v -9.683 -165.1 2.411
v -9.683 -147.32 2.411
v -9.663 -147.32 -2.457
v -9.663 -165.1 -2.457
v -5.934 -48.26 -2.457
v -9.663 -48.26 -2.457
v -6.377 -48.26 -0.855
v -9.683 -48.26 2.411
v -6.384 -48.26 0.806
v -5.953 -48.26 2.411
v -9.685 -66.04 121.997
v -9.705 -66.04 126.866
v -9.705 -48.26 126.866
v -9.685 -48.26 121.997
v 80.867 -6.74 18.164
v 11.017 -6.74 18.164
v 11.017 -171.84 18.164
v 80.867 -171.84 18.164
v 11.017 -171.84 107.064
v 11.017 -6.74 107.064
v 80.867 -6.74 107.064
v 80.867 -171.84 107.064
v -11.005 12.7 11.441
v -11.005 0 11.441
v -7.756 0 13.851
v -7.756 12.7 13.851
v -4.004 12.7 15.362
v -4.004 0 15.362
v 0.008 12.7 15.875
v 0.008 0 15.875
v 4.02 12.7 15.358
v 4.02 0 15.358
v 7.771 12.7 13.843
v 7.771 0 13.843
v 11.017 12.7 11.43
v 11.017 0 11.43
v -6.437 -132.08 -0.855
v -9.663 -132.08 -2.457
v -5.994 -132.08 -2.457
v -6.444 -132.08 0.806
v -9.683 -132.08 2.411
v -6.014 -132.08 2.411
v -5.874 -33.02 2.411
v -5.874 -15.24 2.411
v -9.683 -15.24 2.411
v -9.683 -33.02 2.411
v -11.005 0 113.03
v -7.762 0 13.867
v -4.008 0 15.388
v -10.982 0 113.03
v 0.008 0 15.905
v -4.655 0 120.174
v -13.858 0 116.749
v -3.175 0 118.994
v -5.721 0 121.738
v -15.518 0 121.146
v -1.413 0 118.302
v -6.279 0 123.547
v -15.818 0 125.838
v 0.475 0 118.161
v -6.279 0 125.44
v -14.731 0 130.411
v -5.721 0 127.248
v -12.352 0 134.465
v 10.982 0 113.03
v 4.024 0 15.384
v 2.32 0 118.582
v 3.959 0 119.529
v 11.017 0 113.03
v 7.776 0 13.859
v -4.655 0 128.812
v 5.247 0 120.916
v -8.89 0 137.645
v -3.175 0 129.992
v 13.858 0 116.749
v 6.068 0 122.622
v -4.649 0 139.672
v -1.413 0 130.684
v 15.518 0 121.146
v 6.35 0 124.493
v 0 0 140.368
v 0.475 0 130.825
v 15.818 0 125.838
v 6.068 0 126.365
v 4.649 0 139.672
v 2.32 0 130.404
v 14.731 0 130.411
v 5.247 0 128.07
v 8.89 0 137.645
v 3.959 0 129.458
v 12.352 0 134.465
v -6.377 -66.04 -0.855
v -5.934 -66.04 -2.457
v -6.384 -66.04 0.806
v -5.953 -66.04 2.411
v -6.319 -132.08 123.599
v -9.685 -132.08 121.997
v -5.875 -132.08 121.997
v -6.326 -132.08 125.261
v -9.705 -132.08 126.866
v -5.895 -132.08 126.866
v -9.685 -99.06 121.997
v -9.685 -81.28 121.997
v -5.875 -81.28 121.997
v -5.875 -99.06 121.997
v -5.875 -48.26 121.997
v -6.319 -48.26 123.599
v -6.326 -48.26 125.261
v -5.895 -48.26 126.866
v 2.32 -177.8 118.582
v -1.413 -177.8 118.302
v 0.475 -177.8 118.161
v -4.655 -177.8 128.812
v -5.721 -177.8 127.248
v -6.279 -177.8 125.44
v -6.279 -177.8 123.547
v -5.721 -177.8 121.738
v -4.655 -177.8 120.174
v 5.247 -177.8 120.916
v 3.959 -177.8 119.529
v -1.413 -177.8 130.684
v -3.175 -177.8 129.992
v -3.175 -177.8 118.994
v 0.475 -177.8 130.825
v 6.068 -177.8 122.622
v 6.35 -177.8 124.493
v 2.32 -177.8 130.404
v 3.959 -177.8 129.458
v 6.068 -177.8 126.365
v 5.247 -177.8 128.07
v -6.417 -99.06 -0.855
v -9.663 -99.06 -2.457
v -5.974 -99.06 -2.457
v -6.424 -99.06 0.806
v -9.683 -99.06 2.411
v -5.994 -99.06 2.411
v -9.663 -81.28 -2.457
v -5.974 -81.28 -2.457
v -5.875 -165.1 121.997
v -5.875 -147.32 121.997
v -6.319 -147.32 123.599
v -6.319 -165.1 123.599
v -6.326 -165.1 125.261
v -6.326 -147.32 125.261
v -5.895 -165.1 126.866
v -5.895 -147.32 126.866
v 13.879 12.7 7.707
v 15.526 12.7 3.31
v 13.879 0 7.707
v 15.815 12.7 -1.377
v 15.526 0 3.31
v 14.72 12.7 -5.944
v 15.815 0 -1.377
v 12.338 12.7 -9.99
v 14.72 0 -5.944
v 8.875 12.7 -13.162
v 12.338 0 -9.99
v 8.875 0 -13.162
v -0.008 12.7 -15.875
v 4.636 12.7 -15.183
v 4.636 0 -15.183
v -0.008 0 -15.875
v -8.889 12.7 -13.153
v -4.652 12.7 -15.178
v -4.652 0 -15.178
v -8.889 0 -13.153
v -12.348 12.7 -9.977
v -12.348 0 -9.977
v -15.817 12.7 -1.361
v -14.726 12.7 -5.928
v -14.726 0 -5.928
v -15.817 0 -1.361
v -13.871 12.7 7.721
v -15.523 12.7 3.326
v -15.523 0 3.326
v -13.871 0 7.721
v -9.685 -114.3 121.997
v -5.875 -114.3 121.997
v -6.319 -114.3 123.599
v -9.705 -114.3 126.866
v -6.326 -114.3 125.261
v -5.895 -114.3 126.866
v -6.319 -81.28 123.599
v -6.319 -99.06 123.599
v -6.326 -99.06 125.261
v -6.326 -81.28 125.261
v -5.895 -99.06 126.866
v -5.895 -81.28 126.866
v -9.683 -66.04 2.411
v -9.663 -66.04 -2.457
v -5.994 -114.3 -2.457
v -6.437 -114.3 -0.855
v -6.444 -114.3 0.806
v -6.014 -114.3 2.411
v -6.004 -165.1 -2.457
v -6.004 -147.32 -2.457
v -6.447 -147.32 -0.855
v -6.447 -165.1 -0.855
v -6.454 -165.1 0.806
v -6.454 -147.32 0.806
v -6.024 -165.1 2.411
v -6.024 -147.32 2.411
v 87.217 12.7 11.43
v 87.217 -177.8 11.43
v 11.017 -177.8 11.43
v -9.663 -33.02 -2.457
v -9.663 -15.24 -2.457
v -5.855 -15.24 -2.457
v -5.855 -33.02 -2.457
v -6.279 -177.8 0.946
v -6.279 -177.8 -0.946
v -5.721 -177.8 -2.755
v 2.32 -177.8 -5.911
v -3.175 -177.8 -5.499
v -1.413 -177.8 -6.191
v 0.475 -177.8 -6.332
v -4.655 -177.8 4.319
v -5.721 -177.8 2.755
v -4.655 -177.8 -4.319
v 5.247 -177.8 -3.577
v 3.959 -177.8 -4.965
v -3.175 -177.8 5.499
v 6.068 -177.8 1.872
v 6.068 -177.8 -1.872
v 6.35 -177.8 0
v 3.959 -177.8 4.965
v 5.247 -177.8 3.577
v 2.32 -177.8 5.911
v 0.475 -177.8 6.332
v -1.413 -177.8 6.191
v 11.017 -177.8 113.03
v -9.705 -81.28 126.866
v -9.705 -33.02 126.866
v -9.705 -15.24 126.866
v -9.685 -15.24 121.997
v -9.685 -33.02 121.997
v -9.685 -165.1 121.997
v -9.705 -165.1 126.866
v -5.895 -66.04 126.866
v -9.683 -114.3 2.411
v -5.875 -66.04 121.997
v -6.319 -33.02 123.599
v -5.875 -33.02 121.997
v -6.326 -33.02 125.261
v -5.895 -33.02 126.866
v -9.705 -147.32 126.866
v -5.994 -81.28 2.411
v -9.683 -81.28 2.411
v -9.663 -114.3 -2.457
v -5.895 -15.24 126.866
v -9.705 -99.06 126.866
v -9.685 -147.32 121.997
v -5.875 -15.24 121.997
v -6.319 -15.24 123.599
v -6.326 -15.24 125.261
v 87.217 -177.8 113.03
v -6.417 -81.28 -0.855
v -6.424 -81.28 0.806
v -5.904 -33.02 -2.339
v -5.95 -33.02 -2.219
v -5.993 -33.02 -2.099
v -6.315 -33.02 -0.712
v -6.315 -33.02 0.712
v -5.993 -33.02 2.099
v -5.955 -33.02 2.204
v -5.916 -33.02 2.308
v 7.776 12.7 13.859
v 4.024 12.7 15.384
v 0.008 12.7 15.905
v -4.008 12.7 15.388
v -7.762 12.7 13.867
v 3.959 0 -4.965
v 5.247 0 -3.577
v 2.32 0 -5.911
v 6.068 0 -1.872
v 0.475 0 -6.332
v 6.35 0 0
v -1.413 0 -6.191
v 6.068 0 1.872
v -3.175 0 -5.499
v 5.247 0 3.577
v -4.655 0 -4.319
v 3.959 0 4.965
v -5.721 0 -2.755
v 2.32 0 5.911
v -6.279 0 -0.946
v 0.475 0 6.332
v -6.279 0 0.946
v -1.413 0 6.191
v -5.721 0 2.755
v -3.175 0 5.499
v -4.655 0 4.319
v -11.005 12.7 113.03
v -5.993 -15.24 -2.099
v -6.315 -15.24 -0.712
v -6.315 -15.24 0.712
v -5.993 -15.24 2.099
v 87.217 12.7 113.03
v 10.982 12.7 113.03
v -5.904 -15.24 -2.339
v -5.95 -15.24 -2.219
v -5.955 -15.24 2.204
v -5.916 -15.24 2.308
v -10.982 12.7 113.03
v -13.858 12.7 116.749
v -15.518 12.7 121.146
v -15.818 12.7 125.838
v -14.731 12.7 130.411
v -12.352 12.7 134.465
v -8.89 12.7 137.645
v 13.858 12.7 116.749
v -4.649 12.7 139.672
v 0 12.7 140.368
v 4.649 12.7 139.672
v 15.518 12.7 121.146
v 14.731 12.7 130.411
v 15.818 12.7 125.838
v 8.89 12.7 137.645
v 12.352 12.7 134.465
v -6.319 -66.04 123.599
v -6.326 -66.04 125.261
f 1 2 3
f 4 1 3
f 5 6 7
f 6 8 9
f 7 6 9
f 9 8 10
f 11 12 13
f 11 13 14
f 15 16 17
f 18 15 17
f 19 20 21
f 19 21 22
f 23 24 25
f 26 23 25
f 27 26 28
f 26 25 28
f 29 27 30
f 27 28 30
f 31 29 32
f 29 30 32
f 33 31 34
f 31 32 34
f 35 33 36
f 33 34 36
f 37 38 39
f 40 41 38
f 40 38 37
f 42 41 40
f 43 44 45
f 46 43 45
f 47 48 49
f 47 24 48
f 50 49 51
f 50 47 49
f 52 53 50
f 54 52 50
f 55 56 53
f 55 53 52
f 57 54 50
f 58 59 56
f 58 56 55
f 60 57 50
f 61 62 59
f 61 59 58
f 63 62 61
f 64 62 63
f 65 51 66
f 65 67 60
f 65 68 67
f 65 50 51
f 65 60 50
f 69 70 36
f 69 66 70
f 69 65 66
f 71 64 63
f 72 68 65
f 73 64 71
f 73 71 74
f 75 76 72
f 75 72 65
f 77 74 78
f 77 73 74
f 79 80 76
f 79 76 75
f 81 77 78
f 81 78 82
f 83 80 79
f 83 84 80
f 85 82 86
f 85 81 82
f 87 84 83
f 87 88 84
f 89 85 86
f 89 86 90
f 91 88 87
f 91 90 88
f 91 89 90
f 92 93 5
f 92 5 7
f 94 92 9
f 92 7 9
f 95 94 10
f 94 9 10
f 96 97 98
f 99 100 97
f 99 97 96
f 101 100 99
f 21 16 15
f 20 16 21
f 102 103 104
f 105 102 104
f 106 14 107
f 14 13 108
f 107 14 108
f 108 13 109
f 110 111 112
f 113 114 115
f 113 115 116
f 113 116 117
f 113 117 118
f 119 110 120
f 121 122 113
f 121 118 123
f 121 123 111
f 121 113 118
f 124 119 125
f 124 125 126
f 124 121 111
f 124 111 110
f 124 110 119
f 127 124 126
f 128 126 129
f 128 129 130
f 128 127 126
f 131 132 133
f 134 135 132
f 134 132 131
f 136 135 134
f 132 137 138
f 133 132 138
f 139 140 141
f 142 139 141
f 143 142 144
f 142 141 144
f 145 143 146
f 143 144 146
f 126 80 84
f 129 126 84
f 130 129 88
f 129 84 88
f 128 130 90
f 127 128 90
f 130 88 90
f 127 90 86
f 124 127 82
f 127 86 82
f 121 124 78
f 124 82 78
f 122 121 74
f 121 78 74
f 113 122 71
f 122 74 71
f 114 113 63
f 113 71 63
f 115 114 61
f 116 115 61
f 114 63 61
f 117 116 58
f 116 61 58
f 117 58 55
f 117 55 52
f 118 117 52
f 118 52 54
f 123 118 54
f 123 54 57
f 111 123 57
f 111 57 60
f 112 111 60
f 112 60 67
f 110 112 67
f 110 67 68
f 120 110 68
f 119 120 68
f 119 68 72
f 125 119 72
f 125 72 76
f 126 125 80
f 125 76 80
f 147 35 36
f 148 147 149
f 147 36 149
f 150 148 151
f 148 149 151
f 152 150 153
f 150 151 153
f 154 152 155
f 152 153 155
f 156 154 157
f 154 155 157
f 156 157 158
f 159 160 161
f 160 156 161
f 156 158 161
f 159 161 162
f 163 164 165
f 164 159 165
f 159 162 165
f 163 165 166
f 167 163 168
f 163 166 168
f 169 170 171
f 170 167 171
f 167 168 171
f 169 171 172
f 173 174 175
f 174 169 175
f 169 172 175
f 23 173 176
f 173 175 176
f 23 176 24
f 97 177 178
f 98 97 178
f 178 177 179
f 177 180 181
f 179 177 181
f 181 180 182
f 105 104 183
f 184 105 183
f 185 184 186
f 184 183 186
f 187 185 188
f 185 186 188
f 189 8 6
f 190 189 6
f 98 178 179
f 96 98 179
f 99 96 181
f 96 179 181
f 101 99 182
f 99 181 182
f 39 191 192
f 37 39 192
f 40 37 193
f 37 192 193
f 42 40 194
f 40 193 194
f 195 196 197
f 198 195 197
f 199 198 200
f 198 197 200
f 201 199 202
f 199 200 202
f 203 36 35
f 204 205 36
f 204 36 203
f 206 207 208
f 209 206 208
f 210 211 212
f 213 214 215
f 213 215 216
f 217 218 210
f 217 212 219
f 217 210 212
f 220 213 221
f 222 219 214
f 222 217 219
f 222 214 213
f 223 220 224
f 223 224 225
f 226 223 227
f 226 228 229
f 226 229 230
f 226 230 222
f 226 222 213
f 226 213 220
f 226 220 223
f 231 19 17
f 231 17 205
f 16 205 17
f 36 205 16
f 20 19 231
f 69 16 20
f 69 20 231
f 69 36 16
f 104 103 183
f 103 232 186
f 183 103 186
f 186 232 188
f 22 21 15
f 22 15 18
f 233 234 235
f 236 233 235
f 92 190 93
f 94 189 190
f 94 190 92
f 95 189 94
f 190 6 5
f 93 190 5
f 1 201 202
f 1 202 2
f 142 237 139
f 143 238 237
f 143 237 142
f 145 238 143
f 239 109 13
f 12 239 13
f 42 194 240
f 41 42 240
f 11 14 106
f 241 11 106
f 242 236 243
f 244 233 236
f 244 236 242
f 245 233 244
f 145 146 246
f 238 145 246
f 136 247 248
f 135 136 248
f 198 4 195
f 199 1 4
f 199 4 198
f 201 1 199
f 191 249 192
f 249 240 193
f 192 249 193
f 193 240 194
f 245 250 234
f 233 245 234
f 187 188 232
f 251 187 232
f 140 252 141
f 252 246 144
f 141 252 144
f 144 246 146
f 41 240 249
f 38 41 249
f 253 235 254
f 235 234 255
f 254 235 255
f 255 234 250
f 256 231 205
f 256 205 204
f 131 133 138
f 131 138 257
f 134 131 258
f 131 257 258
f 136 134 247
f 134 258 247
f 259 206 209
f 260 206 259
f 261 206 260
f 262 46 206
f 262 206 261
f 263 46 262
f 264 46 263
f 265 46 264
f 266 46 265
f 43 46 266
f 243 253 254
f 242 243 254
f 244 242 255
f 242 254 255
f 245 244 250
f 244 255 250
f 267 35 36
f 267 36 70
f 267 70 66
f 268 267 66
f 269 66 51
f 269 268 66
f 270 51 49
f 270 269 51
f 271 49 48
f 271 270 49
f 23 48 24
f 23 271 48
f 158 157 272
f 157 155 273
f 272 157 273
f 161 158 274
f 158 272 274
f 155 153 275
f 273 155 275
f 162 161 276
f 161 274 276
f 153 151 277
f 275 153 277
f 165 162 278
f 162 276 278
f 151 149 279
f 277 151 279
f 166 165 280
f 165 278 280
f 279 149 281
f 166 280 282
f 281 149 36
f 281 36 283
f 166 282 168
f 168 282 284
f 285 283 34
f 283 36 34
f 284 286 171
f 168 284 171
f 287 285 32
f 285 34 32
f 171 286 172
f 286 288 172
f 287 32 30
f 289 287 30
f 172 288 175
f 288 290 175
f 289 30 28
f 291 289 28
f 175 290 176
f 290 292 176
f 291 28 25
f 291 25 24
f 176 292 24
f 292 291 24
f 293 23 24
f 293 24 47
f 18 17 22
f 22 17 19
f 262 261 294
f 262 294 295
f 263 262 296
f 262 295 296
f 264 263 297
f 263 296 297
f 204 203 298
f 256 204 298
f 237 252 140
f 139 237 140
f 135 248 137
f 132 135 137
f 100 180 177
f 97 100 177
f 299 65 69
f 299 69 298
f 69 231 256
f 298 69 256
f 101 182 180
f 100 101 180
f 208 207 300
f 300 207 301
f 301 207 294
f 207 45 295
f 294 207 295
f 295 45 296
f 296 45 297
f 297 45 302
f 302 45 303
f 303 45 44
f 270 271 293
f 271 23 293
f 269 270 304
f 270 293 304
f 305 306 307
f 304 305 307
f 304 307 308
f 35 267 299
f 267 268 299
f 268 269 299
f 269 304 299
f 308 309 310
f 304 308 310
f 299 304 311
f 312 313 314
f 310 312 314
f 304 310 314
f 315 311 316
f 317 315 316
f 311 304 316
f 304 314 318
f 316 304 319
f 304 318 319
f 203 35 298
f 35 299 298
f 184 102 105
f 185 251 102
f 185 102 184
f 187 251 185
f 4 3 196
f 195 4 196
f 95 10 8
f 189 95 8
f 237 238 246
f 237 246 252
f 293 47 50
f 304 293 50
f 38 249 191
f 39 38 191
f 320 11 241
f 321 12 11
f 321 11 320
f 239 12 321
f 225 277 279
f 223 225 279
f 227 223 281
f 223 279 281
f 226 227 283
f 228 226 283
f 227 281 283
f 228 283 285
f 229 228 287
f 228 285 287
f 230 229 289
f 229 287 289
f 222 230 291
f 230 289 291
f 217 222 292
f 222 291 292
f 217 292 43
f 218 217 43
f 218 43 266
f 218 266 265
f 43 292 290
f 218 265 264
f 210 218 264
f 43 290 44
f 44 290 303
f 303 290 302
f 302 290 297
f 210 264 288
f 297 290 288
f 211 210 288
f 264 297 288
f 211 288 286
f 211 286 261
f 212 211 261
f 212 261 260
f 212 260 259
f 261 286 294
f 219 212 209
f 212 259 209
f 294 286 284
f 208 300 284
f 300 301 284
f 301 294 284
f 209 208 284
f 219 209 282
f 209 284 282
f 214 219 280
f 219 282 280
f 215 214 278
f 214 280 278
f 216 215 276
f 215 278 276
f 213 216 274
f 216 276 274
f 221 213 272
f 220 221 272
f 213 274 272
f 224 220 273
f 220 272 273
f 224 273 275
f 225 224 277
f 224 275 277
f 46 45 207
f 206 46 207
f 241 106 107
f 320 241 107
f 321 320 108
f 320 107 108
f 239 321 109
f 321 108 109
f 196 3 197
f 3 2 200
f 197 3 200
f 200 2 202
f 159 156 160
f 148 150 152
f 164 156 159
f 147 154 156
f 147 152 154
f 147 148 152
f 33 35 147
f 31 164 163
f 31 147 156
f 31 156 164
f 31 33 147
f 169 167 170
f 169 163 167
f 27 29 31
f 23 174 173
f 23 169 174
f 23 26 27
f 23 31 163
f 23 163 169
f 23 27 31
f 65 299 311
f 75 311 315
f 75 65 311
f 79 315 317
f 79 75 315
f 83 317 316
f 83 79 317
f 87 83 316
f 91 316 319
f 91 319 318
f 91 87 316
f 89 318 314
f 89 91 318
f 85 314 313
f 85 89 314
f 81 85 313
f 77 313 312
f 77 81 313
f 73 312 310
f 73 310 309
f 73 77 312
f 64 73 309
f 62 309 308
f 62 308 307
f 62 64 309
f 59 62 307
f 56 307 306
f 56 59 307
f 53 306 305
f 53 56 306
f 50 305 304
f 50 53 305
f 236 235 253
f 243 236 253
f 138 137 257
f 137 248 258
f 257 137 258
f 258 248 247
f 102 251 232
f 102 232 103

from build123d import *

# Parameters (mm, degrees)
F0_R           = 6.35
F1_DEPTH       = 177.8
F2_R           = 15.875
F2_R_2         = 6.35
F3_DEPTH       = 12.7
F6_DEPTH       = 12.7
F5_R           = 15.875
F7_DEPTH       = 12.7
F8_R           = 6.35
F9_DEPTH       = 177.8
F10_W          = 76.2
F10_H          = 101.6
F11_DEPTH      = 177.8
F11_DEPTH_BACK = 12.7
F12_W          = 165.1
F12_H          = 88.9
F13_DEPTH      = 69.85
F15_START      = 15.24
F15_DEPTH      = 17.78
F17_START      = 15.24
F17_DEPTH      = 17.78
F19_START      = 15.24
F19_DEPTH      = 17.78
F21_START      = 15.24
F21_DEPTH      = 17.78
F23_START      = 15.24
F23_DEPTH      = 17.78
F25_START      = 15.24
F25_DEPTH      = 17.78
F26_START      = 15.24
F26_DEPTH      = 17.78
F27_START      = 15.24
F27_DEPTH      = 17.78
F28_START      = 15.24
F28_DEPTH      = 17.78
F29_START      = 15.24
F29_DEPTH      = 17.78


# Not quite as in the source:
# - ends of sketch curves that miss each other by under 0.0002 mm in the source are joined


with BuildPart() as f1:
    # F0 (on Front) → F1 (new body)
    with BuildSketch(Plane.XZ):
        Circle(F0_R)
    extrude(amount=F1_DEPTH)

    # F2 (on face) → F3 (join)
    with BuildSketch(Plane(origin=(0, 0, 0), x_dir=(-1, 0, 0), z_dir=(0, 1, 0))):
        Circle(F2_R)
        Circle(F2_R_2, mode=Mode.SUBTRACT)
        Circle(F2_R_2)
    extrude(amount=F3_DEPTH)



with BuildPart() as f6:
    # F4 (on face) → F6 (new body)
    with BuildSketch(Plane(origin=(0, 12.7, 0), x_dir=(-1, 0, 0), z_dir=(0, 1, 0))):
        with BuildLine():
            ThreePointArc((-11.0168382488, 11.43), (-0.0082589267, 15.9048158213), (11.0049617512, 11.4414353057))
            Line((11.0049617512, 11.4414353057), (11.0049617512, 113.03))
            Line((11.0049617512, 113.03), (-11.0168382488, 113.03))
            Line((-11.0168382488, 113.03), (-11.0168382488, 11.43))
        make_face()
    extrude(amount=-F6_DEPTH)

    # F5 (on Front) → F7 (join)
    with BuildSketch(Plane.XZ):
        with Locations((0, 124.4932145201)):
            Circle(F5_R)
    extrude(amount=-F7_DEPTH)

    # F8 (on face) → F9 (join)
    with BuildSketch(Plane.XZ):
        with Locations((0, 124.4932145201)):
            Circle(F8_R)
    extrude(amount=F9_DEPTH)


with BuildPart() as f1_1:
    add(f1.part)

    add(f6.part)  # F11 merges F6
    # F10 (on face) → F11 (join, two sides)
    with BuildSketch(Plane.XZ) as f11_sk:
        with Locations((49.1168382488, 62.23)):
            Rectangle(F10_W, F10_H)
    extrude(amount=F11_DEPTH)
    extrude(f11_sk.sketch, amount=-F11_DEPTH_BACK)

    # F12 (on face) → F13 (cut)
    with BuildSketch(Plane(origin=(11.0168382488, 0, 0), x_dir=(0, -1, 0), z_dir=(-1, 0, 0))):
        with Locations((89.290167737, 62.6140534163)):
            Rectangle(F12_W, F12_H)
    extrude(amount=-F13_DEPTH, mode=Mode.SUBTRACT)

    # F14 (on face) → F15 (join)
    with BuildSketch(Plane.XZ.offset(F15_START)):
        with BuildLine():
            ThreePointArc((-5.9930673501, -2.0989625382), (-6.3552943125, 0), (-5.9930673501, 2.0989625382))
            ThreePointArc((-5.9930673501, 2.0989625382), (-5.9358254943, 2.2557649925), (-5.8744818664, 2.4110086688))
            Line((-5.8744818664, 2.4110086688), (-9.6825771242, 2.4110086688))
            Line((-9.6825771242, 2.4110086688), (-9.6630874508, -2.4572083608))
            Line((-9.6630874508, -2.4572083608), (-5.8553075984, -2.4572083608))
            ThreePointArc((-5.8553075984, -2.4572083608), (-5.9268948234, -2.2791265328), (-5.9930673501, -2.0989625382))
        make_face()
    extrude(amount=F15_DEPTH)


with BuildPart() as f17:
    # F16 (on face) → F17 (new body)
    with BuildSketch(Plane.XZ.offset(33.02).offset(F17_START)):
        with BuildLine():
            ThreePointArc((-5.9337336, -2.4567926286), (-6.4358893705, -0.0248806826), (-5.9533966783, 2.4110086688))
            Line((-5.9533966783, 2.4110086688), (-9.6825771242, 2.4110086688))
            Line((-9.6825771242, 2.4110086688), (-9.6630891152, -2.4567926286))
            Line((-9.6630891152, -2.4567926286), (-5.9337336, -2.4567926286))
        make_face()
    extrude(amount=F17_DEPTH)


with BuildPart() as f19:
    # F18 (on face) → F19 (new body)
    with BuildSketch(Plane.XZ.offset(66.04).offset(F19_START)):
        with BuildLine():
            ThreePointArc((-5.9739191651, -2.4566159906), (-6.4760745484, -0.0247997357), (-5.9936559097, 2.4110086688))
            Line((-5.9936559097, 2.4110086688), (-9.6825771242, 2.4110086688))
            Line((-9.6825771242, 2.4110086688), (-9.6630898224, -2.4566159906))
            Line((-9.6630898224, -2.4566159906), (-5.9739191651, -2.4566159906))
        make_face()
    extrude(amount=F19_DEPTH)


with BuildPart() as f21:
    # F20 (on face) → F21 (new body)
    with BuildSketch(Plane.XZ.offset(99.06).offset(F21_START)):
        with BuildLine():
            ThreePointArc((-5.9939809047, -2.4565356888), (-6.4961361114, -0.0247629358), (-6.0137511368, 2.4110086688))
            Line((-6.0137511368, 2.4110086688), (-9.6825771242, 2.4110086688))
            Line((-9.6825771242, 2.4110086688), (-9.6630898224, -2.4566159906))
            Line((-9.6630898224, -2.4566159906), (-5.9939809047, -2.4565356888))
        make_face()
    extrude(amount=F21_DEPTH)


with BuildPart() as f23:
    # F22 (on face) → F23 (new body)
    with BuildSketch(Plane.XZ.offset(132.08).offset(F23_START)):
        with BuildLine():
            ThreePointArc((-6.0039925358, -2.4565433546), (-6.5061477593, -0.0247664488), (-6.0237595711, 2.4110086688))
            Line((-6.0237595711, 2.4110086688), (-9.6825771242, 2.4110086688))
            Line((-9.6825771242, 2.4110086688), (-9.6630898224, -2.4566159906))
            Line((-9.6630898224, -2.4566159906), (-6.0039925358, -2.4565433546))
        make_face()
    extrude(amount=F23_DEPTH)


with BuildPart() as f25:
    # F24 (on face) → F25 (new body)
    with BuildSketch(Plane.XZ.offset(F25_START)):
        with BuildLine():
            ThreePointArc((-5.875426674, 121.9974181886), (-6.3775833502, 124.4295553562), (-5.8949163474, 126.8656352182))
            Line((-5.8949163474, 126.8656352182), (-9.7049163474, 126.8656352182))
            Line((-9.7049163474, 126.8656352182), (-9.685426674, 121.9974181886))
            Line((-9.685426674, 121.9974181886), (-5.875426674, 121.9974181886))
        make_face()
    extrude(amount=F25_DEPTH)


with BuildPart() as f26:
    # F25_face (on face) → F26 (new body)
    with BuildSketch(Plane(origin=(-7.9525870478, -33.02, 124.4316019733), x_dir=(1, 0, 0), z_dir=(0, -1, 0)).offset(F26_START)):
        with BuildLine():
            ThreePointArc((2.0771603738, -2.4341837848), (1.5750036976, -0.0020466171), (2.0576707004, 2.4340332449))
            Line((2.0576707004, 2.4340332449), (-1.7523292996, 2.4340332449))
            Line((-1.7523292996, 2.4340332449), (-1.7328396262, -2.4341837848))
            Line((-1.7328396262, -2.4341837848), (2.0771603738, -2.4341837848))
        make_face()
    extrude(amount=F26_DEPTH)


with BuildPart() as f27:
    # F26_face (on face) → F27 (new body)
    with BuildSketch(Plane(origin=(-7.9525870478, -66.04, 124.4316019733), x_dir=(1, 0, 0), z_dir=(0, -1, 0)).offset(F27_START)):
        with BuildLine():
            Line((-1.7328396262, -2.4341837848), (2.0771603738, -2.4341837848))
            ThreePointArc((2.0771603738, -2.4341837848), (1.5750036976, -0.0020466171), (2.0576707004, 2.4340332449))
            Line((2.0576707004, 2.4340332449), (-1.7523292996, 2.4340332449))
            Line((-1.7523292996, 2.4340332449), (-1.7328396262, -2.4341837848))
        make_face()
    extrude(amount=F27_DEPTH)


with BuildPart() as f28:
    # F27_face (on face) → F28 (new body)
    with BuildSketch(Plane(origin=(-7.9525870478, -99.06, 124.4316019733), x_dir=(1, 0, 0), z_dir=(0, -1, 0)).offset(F28_START)):
        with BuildLine():
            Line((2.0576707004, 2.4340332449), (-1.7523292996, 2.4340332449))
            Line((-1.7523292996, 2.4340332449), (-1.7328396262, -2.4341837848))
            Line((-1.7328396262, -2.4341837848), (2.0771603738, -2.4341837848))
            ThreePointArc((2.0771603738, -2.4341837848), (1.5750036976, -0.0020466171), (2.0576707004, 2.4340332449))
        make_face()
    extrude(amount=F28_DEPTH)


with BuildPart() as f29:
    # F28_face (on face) → F29 (new body)
    with BuildSketch(Plane(origin=(-7.9525870478, -132.08, 124.4316019733), x_dir=(1, 0, 0), z_dir=(0, -1, 0)).offset(F29_START)):
        with BuildLine():
            Line((2.0576707004, 2.4340332449), (-1.7523292996, 2.4340332449))
            Line((-1.7523292996, 2.4340332449), (-1.7328396262, -2.4341837848))
            Line((-1.7328396262, -2.4341837848), (2.0771603738, -2.4341837848))
            ThreePointArc((2.0771603738, -2.4341837848), (1.5750036976, -0.0020466171), (2.0576707004, 2.4340332449))
        make_face()
    extrude(amount=F29_DEPTH)


solid = Compound([f1_1.part, f17.part, f19.part, f21.part, f23.part, f25.part, f26.part, f27.part, f28.part, f29.part])
